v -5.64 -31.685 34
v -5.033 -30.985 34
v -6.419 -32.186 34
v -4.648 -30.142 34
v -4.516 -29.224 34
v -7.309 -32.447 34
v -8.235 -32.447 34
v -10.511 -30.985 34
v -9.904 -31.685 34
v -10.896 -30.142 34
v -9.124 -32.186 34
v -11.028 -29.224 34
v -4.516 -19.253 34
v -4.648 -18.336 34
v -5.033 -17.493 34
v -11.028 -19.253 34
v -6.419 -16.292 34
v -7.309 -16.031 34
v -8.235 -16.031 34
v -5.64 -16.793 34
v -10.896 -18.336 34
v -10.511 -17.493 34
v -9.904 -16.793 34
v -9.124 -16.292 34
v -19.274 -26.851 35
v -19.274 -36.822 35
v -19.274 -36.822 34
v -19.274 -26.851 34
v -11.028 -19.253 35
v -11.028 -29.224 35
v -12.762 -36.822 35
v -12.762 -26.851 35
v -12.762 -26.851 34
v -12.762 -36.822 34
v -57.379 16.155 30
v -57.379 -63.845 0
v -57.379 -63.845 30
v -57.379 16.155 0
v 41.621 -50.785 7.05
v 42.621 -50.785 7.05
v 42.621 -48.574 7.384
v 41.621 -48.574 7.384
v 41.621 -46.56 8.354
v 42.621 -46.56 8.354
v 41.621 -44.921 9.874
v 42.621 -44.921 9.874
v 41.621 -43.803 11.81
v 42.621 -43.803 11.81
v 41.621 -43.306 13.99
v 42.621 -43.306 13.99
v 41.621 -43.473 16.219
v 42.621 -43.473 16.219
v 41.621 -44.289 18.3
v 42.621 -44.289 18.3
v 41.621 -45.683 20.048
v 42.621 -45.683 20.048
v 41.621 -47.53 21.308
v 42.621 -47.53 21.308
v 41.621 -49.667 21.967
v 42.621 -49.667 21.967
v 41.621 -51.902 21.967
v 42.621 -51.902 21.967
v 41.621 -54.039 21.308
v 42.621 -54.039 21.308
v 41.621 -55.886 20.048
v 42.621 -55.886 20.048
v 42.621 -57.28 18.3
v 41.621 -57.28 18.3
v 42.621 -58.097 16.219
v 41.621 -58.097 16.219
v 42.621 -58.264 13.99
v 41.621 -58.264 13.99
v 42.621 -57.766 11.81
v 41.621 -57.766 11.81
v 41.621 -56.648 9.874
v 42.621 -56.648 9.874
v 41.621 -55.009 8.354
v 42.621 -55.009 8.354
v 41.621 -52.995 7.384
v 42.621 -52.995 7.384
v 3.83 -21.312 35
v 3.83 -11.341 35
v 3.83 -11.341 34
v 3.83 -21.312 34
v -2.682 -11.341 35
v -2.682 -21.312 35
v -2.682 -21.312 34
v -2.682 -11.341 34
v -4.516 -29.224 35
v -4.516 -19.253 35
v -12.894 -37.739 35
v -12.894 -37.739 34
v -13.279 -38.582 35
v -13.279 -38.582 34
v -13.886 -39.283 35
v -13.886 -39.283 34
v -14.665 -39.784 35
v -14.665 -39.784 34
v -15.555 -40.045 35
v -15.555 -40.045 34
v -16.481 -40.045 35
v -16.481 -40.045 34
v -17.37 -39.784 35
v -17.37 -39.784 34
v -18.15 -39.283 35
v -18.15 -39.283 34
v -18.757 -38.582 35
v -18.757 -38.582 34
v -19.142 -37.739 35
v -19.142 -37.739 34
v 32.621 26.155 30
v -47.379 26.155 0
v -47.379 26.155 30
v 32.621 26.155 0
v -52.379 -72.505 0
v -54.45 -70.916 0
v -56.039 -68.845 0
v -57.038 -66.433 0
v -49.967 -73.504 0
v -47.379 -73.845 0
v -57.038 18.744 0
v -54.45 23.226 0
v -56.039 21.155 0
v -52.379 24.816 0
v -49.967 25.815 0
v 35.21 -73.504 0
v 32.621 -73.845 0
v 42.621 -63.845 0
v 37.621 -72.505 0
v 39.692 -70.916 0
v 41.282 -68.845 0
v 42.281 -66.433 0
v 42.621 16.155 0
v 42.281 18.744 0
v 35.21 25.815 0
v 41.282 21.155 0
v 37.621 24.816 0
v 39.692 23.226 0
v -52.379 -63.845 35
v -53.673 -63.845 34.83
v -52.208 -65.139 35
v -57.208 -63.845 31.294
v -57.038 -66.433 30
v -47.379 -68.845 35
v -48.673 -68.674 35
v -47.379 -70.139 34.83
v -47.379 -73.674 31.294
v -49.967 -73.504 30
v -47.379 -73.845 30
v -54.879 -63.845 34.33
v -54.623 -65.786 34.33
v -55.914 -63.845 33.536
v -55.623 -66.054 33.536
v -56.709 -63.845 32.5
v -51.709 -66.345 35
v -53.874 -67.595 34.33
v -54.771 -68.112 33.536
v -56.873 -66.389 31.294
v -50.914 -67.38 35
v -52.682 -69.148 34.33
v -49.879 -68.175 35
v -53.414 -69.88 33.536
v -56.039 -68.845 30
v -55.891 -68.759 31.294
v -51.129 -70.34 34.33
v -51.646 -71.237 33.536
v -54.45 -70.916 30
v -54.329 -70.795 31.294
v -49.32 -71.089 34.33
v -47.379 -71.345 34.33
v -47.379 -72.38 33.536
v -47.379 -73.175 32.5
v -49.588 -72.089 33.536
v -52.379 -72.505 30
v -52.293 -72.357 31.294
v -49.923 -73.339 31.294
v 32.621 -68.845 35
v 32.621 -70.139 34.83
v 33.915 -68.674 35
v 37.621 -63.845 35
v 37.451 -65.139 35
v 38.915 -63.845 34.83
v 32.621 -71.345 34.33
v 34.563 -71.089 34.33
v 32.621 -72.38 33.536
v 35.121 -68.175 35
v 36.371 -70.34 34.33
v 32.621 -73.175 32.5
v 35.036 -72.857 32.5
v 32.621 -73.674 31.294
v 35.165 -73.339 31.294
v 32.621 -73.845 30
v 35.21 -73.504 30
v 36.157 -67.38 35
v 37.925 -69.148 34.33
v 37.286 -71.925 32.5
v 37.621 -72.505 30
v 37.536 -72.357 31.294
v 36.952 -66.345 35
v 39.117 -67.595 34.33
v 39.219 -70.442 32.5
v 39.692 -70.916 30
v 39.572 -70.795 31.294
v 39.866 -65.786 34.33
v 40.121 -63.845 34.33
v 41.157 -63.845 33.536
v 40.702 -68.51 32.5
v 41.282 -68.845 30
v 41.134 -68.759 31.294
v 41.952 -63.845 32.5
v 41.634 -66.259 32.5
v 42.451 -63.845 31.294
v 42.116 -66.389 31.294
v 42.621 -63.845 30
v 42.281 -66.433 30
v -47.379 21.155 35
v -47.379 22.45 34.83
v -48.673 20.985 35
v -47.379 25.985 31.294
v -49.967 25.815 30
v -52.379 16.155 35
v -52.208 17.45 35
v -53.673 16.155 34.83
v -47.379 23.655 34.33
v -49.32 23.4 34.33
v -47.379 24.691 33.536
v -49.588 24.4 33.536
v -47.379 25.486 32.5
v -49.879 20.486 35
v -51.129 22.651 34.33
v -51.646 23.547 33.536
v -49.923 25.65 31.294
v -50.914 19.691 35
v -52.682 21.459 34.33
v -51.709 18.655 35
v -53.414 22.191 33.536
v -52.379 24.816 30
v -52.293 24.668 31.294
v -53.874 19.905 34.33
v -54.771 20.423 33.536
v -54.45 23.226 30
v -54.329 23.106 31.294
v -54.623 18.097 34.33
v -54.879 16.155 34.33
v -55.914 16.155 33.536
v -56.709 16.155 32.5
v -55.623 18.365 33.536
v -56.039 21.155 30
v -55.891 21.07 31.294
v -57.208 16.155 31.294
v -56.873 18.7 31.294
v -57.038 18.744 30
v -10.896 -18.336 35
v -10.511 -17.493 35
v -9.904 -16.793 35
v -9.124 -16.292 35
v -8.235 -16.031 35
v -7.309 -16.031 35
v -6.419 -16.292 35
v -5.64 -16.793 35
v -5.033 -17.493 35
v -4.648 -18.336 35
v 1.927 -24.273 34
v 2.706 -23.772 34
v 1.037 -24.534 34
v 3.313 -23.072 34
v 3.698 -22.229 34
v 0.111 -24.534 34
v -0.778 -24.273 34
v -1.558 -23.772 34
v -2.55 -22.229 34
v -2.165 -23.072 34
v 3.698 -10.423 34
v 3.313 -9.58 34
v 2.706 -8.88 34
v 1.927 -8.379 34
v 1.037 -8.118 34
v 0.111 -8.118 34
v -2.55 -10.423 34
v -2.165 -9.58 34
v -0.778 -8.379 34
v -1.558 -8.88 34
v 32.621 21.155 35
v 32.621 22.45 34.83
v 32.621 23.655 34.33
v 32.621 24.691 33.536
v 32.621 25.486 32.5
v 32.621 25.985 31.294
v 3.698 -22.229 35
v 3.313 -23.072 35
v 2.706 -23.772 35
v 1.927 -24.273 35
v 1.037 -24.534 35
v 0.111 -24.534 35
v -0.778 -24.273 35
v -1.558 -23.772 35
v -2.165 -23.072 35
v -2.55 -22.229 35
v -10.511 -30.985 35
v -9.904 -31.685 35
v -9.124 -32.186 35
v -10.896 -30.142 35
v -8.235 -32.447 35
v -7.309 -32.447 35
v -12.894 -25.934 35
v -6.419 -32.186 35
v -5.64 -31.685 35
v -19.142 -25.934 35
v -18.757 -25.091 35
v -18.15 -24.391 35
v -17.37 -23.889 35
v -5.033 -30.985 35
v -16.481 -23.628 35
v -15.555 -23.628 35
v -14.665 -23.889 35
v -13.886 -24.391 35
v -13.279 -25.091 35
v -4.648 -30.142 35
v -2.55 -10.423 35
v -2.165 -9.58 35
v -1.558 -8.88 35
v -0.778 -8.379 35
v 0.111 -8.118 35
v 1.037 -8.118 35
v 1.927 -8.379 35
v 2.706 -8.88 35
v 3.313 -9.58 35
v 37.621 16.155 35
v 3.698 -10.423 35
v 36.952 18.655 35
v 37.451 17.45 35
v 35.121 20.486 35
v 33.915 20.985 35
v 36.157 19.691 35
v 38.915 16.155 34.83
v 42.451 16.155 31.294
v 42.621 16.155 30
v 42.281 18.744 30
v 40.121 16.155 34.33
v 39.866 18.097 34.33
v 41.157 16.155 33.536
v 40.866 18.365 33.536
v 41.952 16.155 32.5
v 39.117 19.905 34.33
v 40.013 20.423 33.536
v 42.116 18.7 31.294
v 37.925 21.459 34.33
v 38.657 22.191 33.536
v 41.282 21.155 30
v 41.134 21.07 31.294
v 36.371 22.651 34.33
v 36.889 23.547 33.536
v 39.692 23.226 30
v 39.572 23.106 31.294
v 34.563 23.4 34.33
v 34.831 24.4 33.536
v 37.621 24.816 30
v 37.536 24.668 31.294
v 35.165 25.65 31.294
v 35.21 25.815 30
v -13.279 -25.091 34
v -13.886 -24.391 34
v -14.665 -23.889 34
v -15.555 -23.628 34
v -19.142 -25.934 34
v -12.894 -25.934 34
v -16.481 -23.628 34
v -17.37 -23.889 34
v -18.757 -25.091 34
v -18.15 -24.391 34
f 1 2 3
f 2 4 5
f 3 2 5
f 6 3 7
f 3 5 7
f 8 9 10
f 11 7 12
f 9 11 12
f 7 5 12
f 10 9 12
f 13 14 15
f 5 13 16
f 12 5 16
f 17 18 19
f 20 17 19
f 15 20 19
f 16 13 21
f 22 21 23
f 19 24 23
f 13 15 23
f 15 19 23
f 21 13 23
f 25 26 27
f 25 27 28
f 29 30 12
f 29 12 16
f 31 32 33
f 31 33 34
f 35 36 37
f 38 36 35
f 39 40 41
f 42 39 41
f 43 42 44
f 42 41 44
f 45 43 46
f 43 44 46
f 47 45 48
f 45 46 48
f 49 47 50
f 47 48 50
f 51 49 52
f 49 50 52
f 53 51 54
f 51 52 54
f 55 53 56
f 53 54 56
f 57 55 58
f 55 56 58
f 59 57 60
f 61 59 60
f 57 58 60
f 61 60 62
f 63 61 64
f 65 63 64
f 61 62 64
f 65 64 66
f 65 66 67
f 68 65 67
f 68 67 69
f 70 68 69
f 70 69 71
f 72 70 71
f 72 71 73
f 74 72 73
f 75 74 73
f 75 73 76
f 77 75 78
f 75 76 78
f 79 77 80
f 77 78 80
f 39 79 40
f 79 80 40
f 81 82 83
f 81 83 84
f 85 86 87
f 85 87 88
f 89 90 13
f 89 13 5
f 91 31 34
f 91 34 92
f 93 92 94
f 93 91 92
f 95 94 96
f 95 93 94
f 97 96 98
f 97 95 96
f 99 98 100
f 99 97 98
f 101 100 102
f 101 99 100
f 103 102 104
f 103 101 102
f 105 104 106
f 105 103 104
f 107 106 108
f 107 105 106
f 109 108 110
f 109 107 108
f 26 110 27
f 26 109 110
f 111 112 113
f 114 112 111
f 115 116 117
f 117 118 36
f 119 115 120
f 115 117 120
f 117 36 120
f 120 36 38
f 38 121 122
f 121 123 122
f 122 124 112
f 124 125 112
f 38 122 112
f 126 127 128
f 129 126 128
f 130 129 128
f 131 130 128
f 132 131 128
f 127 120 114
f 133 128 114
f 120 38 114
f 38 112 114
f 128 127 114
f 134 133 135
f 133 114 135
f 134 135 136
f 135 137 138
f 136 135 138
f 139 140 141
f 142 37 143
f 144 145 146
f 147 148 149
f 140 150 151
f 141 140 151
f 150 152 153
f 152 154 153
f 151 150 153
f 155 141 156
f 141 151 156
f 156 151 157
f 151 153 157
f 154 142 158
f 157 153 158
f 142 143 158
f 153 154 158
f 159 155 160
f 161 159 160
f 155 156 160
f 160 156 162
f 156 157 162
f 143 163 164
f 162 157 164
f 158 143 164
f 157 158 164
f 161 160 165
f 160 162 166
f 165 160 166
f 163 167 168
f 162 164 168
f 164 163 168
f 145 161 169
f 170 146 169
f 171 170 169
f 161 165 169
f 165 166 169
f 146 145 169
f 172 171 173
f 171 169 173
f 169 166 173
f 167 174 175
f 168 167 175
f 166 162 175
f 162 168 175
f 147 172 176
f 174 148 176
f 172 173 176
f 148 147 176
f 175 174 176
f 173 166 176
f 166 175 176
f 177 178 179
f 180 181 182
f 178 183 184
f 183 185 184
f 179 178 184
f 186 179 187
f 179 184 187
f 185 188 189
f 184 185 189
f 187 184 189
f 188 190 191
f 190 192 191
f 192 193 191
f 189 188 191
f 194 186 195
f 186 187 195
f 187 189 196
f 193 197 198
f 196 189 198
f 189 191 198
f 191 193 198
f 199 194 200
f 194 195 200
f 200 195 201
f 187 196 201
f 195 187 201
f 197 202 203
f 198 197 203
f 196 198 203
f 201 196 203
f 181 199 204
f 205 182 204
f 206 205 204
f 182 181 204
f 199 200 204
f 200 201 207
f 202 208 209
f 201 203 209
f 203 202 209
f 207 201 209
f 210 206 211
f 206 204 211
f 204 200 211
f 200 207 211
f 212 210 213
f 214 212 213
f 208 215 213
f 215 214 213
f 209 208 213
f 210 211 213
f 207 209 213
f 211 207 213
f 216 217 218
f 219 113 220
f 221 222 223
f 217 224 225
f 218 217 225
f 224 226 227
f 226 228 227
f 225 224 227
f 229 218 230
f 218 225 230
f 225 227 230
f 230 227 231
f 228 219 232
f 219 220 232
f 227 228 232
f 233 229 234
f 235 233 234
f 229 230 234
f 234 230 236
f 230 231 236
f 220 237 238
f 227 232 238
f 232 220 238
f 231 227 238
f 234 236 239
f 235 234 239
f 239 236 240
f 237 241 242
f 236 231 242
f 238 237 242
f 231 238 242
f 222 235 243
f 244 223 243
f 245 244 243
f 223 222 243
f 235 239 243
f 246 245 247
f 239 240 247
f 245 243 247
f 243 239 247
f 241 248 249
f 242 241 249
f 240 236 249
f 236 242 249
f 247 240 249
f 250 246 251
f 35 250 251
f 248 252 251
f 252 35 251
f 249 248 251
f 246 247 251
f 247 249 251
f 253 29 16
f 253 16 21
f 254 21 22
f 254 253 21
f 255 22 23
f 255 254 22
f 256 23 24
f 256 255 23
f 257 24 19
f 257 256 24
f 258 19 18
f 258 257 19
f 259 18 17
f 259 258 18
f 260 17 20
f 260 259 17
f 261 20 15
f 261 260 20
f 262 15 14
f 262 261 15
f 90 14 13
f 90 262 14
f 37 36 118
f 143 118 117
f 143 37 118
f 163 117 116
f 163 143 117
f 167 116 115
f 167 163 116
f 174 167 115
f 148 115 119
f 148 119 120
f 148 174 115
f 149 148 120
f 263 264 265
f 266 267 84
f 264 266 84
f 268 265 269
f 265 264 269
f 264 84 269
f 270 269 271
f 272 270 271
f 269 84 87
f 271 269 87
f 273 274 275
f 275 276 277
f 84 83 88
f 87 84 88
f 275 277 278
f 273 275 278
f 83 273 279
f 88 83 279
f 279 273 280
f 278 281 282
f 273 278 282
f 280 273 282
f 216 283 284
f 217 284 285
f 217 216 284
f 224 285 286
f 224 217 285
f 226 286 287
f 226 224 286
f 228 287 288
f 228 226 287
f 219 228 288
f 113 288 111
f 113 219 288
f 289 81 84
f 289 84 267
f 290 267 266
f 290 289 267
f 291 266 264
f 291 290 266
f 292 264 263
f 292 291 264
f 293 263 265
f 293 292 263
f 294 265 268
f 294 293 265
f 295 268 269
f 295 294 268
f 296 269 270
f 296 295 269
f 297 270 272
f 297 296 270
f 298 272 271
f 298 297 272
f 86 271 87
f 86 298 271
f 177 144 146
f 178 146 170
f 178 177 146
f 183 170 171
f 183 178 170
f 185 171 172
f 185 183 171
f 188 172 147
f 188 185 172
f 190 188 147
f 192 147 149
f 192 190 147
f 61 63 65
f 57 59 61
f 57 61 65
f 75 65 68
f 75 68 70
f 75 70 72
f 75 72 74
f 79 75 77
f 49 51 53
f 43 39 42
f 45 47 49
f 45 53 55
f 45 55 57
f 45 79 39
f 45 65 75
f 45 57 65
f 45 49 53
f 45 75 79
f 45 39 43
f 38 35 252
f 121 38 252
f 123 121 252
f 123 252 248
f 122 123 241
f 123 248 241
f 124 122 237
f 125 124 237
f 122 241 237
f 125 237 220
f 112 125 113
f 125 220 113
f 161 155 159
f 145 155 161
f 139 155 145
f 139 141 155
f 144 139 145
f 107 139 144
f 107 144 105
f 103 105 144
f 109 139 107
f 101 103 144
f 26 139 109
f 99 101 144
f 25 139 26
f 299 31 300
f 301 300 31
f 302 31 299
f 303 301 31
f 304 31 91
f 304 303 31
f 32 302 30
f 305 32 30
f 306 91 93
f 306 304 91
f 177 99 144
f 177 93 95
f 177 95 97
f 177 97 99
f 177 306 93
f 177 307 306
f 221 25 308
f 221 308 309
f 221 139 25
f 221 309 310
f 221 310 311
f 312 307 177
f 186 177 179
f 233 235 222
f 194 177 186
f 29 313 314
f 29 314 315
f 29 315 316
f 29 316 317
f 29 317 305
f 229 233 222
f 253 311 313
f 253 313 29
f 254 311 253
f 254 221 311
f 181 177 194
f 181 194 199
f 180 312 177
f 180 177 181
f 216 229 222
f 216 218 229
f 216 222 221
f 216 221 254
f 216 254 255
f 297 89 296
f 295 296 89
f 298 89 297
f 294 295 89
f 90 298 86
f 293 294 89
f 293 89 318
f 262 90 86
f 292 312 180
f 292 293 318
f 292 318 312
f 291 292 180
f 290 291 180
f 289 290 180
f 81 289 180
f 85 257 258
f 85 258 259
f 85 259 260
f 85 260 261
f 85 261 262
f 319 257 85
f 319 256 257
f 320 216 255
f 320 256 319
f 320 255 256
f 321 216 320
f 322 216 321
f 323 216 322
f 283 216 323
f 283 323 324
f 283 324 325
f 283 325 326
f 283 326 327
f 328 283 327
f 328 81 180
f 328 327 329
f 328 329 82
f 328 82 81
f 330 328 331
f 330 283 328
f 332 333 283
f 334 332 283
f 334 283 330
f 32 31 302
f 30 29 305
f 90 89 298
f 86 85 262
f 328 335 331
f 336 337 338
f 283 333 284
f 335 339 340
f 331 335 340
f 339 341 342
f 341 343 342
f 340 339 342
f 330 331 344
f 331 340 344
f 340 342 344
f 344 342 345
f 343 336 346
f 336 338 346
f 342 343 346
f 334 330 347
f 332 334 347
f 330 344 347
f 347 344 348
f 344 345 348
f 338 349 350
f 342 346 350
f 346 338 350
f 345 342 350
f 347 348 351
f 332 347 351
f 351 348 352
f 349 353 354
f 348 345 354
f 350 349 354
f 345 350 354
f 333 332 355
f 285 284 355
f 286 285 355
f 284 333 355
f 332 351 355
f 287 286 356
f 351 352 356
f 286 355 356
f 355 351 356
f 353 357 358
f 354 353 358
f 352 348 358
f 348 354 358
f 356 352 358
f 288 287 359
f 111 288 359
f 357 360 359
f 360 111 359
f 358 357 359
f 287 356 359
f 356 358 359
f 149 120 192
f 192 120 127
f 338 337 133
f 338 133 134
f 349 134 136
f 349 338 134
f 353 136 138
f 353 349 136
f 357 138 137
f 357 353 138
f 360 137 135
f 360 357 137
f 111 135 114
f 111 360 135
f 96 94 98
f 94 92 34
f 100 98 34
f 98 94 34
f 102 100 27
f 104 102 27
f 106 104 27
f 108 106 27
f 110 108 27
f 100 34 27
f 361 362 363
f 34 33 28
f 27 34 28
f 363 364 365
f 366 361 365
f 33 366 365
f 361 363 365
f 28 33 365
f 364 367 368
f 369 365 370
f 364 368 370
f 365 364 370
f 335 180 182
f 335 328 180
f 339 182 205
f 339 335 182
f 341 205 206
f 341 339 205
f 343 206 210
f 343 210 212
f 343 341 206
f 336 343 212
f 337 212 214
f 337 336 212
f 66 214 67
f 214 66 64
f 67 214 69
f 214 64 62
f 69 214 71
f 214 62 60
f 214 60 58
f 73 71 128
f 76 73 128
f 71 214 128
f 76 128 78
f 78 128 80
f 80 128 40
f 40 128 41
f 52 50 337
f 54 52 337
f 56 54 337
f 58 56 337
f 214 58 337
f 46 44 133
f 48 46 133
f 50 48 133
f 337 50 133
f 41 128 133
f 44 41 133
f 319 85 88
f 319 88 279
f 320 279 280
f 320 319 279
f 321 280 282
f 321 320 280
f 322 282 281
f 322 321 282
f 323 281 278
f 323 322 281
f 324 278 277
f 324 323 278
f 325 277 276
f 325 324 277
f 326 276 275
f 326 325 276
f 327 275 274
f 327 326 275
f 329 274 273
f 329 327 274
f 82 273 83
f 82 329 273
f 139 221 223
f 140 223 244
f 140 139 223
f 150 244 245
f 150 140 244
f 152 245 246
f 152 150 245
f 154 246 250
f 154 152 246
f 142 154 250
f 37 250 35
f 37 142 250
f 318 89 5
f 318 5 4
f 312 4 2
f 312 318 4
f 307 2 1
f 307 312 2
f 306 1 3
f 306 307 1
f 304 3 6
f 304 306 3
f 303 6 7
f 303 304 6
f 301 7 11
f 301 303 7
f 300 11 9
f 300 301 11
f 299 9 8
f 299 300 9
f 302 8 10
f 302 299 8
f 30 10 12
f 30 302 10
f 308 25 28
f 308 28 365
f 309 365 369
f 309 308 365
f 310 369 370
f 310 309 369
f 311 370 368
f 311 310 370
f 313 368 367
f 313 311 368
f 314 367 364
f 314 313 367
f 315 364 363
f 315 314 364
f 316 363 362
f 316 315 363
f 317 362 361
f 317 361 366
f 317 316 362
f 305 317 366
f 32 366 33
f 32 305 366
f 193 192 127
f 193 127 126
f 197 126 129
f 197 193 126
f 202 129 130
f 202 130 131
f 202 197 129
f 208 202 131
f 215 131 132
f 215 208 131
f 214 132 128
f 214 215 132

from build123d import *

# Parameters (mm, degrees)
SKETCH1_W           = 100
SKETCH1_H           = 100
BOSS_EXTRUDE2_DEPTH = 35
FILLET3_R           = 10
FILLET4_R           = 5
SKETCH2_R           = 7.5
CUT_EXTRUDE1_DEPTH  = 1
CUT_EXTRUDE2_DEPTH  = 1


with BuildPart() as part:
    # Sketch1 → Boss-Extrude2 (new body)
    with BuildSketch(Plane.XY):
        with Locations((-7.378614961, -23.844584937)):
            Rectangle(SKETCH1_W, SKETCH1_H)
    extrude(amount=BOSS_EXTRUDE2_DEPTH)

    # Fillet3
    fillet3_edges = [part.edges().sort_by_distance(p)[0] for p in [
        (-57.378614961, 26.155415063, 17.5),
        (42.621385039, 26.155415063, 17.5),
        (42.621385039, -73.844584937, 17.5),
        (-57.378614961, -73.844584937, 17.5),
    ]]
    fillet(fillet3_edges, radius=FILLET3_R)

    # Fillet4
    fillet4_edges = [part.edges().sort_by_distance(p)[0] for p in [
        (42.621385039, -23.844584937, 35),
        (-7.378614961, -73.844584937, 35),
        (-57.378614961, -23.844584937, 35),
        (-7.378614961, 26.155415063, 35),
        (39.692452851, 23.226482875, 35),
        (-54.449682772, 23.226482875, 35),
        (-54.449682772, -70.915652749, 35),
        (39.692452851, -70.915652749, 35),
    ]]
    fillet(fillet4_edges, radius=FILLET4_R)

    # Sketch2 → Cut-Extrude1 (cut)
    with BuildSketch(Plane(origin=(42.621385039, 0, 0), x_dir=(0, 0, -1), z_dir=(1, 0, 0))):
        with Locations((-14.550369157, -50.784546634)):
            Circle(SKETCH2_R)
    extrude(amount=-CUT_EXTRUDE1_DEPTH, mode=Mode.SUBTRACT)

    # Sketch3 → Cut-Extrude2 (cut)
    with BuildSketch(Plane.XY.offset(35)):
        with BuildLine():
            Line((-19.273762165, -36.822061823), (-19.273762165, -26.851128879))
            ThreePointArc((-19.273762165, -26.851128879), (-16.017889756, -23.595256471), (-12.762017347, -26.851128879))
            Line((-12.762017347, -26.851128879), (-12.762017347, -36.822061823))
            ThreePointArc((-12.762017347, -36.822061823), (-16.017889756, -40.077934232), (-19.273762165, -36.822061823))
        make_face()
        with BuildLine():
            Line((-11.027771482, -29.224294891), (-11.027771482, -19.253361947))
            ThreePointArc((-11.027771482, -19.253361947), (-7.771899073, -15.997489538), (-4.516026664, -19.253361947))
            Line((-4.516026664, -19.253361947), (-4.516026664, -29.224294891))
            ThreePointArc((-4.516026664, -29.224294891), (-7.771899073, -32.4801673), (-11.027771482, -29.224294891))
        make_face()
        with BuildLine():
            Line((-2.681741214, -21.311514936), (-2.681741214, -11.340581993))
            ThreePointArc((-2.681741214, -11.340581993), (0.574131194, -8.084709584), (3.830003603, -11.340581993))
            Line((3.830003603, -11.340581993), (3.830003603, -21.311514936))
            ThreePointArc((3.830003603, -21.311514936), (0.574131194, -24.567387345), (-2.681741214, -21.311514936))
        make_face()
    extrude(amount=-CUT_EXTRUDE2_DEPTH, mode=Mode.SUBTRACT)


solid = part.part
